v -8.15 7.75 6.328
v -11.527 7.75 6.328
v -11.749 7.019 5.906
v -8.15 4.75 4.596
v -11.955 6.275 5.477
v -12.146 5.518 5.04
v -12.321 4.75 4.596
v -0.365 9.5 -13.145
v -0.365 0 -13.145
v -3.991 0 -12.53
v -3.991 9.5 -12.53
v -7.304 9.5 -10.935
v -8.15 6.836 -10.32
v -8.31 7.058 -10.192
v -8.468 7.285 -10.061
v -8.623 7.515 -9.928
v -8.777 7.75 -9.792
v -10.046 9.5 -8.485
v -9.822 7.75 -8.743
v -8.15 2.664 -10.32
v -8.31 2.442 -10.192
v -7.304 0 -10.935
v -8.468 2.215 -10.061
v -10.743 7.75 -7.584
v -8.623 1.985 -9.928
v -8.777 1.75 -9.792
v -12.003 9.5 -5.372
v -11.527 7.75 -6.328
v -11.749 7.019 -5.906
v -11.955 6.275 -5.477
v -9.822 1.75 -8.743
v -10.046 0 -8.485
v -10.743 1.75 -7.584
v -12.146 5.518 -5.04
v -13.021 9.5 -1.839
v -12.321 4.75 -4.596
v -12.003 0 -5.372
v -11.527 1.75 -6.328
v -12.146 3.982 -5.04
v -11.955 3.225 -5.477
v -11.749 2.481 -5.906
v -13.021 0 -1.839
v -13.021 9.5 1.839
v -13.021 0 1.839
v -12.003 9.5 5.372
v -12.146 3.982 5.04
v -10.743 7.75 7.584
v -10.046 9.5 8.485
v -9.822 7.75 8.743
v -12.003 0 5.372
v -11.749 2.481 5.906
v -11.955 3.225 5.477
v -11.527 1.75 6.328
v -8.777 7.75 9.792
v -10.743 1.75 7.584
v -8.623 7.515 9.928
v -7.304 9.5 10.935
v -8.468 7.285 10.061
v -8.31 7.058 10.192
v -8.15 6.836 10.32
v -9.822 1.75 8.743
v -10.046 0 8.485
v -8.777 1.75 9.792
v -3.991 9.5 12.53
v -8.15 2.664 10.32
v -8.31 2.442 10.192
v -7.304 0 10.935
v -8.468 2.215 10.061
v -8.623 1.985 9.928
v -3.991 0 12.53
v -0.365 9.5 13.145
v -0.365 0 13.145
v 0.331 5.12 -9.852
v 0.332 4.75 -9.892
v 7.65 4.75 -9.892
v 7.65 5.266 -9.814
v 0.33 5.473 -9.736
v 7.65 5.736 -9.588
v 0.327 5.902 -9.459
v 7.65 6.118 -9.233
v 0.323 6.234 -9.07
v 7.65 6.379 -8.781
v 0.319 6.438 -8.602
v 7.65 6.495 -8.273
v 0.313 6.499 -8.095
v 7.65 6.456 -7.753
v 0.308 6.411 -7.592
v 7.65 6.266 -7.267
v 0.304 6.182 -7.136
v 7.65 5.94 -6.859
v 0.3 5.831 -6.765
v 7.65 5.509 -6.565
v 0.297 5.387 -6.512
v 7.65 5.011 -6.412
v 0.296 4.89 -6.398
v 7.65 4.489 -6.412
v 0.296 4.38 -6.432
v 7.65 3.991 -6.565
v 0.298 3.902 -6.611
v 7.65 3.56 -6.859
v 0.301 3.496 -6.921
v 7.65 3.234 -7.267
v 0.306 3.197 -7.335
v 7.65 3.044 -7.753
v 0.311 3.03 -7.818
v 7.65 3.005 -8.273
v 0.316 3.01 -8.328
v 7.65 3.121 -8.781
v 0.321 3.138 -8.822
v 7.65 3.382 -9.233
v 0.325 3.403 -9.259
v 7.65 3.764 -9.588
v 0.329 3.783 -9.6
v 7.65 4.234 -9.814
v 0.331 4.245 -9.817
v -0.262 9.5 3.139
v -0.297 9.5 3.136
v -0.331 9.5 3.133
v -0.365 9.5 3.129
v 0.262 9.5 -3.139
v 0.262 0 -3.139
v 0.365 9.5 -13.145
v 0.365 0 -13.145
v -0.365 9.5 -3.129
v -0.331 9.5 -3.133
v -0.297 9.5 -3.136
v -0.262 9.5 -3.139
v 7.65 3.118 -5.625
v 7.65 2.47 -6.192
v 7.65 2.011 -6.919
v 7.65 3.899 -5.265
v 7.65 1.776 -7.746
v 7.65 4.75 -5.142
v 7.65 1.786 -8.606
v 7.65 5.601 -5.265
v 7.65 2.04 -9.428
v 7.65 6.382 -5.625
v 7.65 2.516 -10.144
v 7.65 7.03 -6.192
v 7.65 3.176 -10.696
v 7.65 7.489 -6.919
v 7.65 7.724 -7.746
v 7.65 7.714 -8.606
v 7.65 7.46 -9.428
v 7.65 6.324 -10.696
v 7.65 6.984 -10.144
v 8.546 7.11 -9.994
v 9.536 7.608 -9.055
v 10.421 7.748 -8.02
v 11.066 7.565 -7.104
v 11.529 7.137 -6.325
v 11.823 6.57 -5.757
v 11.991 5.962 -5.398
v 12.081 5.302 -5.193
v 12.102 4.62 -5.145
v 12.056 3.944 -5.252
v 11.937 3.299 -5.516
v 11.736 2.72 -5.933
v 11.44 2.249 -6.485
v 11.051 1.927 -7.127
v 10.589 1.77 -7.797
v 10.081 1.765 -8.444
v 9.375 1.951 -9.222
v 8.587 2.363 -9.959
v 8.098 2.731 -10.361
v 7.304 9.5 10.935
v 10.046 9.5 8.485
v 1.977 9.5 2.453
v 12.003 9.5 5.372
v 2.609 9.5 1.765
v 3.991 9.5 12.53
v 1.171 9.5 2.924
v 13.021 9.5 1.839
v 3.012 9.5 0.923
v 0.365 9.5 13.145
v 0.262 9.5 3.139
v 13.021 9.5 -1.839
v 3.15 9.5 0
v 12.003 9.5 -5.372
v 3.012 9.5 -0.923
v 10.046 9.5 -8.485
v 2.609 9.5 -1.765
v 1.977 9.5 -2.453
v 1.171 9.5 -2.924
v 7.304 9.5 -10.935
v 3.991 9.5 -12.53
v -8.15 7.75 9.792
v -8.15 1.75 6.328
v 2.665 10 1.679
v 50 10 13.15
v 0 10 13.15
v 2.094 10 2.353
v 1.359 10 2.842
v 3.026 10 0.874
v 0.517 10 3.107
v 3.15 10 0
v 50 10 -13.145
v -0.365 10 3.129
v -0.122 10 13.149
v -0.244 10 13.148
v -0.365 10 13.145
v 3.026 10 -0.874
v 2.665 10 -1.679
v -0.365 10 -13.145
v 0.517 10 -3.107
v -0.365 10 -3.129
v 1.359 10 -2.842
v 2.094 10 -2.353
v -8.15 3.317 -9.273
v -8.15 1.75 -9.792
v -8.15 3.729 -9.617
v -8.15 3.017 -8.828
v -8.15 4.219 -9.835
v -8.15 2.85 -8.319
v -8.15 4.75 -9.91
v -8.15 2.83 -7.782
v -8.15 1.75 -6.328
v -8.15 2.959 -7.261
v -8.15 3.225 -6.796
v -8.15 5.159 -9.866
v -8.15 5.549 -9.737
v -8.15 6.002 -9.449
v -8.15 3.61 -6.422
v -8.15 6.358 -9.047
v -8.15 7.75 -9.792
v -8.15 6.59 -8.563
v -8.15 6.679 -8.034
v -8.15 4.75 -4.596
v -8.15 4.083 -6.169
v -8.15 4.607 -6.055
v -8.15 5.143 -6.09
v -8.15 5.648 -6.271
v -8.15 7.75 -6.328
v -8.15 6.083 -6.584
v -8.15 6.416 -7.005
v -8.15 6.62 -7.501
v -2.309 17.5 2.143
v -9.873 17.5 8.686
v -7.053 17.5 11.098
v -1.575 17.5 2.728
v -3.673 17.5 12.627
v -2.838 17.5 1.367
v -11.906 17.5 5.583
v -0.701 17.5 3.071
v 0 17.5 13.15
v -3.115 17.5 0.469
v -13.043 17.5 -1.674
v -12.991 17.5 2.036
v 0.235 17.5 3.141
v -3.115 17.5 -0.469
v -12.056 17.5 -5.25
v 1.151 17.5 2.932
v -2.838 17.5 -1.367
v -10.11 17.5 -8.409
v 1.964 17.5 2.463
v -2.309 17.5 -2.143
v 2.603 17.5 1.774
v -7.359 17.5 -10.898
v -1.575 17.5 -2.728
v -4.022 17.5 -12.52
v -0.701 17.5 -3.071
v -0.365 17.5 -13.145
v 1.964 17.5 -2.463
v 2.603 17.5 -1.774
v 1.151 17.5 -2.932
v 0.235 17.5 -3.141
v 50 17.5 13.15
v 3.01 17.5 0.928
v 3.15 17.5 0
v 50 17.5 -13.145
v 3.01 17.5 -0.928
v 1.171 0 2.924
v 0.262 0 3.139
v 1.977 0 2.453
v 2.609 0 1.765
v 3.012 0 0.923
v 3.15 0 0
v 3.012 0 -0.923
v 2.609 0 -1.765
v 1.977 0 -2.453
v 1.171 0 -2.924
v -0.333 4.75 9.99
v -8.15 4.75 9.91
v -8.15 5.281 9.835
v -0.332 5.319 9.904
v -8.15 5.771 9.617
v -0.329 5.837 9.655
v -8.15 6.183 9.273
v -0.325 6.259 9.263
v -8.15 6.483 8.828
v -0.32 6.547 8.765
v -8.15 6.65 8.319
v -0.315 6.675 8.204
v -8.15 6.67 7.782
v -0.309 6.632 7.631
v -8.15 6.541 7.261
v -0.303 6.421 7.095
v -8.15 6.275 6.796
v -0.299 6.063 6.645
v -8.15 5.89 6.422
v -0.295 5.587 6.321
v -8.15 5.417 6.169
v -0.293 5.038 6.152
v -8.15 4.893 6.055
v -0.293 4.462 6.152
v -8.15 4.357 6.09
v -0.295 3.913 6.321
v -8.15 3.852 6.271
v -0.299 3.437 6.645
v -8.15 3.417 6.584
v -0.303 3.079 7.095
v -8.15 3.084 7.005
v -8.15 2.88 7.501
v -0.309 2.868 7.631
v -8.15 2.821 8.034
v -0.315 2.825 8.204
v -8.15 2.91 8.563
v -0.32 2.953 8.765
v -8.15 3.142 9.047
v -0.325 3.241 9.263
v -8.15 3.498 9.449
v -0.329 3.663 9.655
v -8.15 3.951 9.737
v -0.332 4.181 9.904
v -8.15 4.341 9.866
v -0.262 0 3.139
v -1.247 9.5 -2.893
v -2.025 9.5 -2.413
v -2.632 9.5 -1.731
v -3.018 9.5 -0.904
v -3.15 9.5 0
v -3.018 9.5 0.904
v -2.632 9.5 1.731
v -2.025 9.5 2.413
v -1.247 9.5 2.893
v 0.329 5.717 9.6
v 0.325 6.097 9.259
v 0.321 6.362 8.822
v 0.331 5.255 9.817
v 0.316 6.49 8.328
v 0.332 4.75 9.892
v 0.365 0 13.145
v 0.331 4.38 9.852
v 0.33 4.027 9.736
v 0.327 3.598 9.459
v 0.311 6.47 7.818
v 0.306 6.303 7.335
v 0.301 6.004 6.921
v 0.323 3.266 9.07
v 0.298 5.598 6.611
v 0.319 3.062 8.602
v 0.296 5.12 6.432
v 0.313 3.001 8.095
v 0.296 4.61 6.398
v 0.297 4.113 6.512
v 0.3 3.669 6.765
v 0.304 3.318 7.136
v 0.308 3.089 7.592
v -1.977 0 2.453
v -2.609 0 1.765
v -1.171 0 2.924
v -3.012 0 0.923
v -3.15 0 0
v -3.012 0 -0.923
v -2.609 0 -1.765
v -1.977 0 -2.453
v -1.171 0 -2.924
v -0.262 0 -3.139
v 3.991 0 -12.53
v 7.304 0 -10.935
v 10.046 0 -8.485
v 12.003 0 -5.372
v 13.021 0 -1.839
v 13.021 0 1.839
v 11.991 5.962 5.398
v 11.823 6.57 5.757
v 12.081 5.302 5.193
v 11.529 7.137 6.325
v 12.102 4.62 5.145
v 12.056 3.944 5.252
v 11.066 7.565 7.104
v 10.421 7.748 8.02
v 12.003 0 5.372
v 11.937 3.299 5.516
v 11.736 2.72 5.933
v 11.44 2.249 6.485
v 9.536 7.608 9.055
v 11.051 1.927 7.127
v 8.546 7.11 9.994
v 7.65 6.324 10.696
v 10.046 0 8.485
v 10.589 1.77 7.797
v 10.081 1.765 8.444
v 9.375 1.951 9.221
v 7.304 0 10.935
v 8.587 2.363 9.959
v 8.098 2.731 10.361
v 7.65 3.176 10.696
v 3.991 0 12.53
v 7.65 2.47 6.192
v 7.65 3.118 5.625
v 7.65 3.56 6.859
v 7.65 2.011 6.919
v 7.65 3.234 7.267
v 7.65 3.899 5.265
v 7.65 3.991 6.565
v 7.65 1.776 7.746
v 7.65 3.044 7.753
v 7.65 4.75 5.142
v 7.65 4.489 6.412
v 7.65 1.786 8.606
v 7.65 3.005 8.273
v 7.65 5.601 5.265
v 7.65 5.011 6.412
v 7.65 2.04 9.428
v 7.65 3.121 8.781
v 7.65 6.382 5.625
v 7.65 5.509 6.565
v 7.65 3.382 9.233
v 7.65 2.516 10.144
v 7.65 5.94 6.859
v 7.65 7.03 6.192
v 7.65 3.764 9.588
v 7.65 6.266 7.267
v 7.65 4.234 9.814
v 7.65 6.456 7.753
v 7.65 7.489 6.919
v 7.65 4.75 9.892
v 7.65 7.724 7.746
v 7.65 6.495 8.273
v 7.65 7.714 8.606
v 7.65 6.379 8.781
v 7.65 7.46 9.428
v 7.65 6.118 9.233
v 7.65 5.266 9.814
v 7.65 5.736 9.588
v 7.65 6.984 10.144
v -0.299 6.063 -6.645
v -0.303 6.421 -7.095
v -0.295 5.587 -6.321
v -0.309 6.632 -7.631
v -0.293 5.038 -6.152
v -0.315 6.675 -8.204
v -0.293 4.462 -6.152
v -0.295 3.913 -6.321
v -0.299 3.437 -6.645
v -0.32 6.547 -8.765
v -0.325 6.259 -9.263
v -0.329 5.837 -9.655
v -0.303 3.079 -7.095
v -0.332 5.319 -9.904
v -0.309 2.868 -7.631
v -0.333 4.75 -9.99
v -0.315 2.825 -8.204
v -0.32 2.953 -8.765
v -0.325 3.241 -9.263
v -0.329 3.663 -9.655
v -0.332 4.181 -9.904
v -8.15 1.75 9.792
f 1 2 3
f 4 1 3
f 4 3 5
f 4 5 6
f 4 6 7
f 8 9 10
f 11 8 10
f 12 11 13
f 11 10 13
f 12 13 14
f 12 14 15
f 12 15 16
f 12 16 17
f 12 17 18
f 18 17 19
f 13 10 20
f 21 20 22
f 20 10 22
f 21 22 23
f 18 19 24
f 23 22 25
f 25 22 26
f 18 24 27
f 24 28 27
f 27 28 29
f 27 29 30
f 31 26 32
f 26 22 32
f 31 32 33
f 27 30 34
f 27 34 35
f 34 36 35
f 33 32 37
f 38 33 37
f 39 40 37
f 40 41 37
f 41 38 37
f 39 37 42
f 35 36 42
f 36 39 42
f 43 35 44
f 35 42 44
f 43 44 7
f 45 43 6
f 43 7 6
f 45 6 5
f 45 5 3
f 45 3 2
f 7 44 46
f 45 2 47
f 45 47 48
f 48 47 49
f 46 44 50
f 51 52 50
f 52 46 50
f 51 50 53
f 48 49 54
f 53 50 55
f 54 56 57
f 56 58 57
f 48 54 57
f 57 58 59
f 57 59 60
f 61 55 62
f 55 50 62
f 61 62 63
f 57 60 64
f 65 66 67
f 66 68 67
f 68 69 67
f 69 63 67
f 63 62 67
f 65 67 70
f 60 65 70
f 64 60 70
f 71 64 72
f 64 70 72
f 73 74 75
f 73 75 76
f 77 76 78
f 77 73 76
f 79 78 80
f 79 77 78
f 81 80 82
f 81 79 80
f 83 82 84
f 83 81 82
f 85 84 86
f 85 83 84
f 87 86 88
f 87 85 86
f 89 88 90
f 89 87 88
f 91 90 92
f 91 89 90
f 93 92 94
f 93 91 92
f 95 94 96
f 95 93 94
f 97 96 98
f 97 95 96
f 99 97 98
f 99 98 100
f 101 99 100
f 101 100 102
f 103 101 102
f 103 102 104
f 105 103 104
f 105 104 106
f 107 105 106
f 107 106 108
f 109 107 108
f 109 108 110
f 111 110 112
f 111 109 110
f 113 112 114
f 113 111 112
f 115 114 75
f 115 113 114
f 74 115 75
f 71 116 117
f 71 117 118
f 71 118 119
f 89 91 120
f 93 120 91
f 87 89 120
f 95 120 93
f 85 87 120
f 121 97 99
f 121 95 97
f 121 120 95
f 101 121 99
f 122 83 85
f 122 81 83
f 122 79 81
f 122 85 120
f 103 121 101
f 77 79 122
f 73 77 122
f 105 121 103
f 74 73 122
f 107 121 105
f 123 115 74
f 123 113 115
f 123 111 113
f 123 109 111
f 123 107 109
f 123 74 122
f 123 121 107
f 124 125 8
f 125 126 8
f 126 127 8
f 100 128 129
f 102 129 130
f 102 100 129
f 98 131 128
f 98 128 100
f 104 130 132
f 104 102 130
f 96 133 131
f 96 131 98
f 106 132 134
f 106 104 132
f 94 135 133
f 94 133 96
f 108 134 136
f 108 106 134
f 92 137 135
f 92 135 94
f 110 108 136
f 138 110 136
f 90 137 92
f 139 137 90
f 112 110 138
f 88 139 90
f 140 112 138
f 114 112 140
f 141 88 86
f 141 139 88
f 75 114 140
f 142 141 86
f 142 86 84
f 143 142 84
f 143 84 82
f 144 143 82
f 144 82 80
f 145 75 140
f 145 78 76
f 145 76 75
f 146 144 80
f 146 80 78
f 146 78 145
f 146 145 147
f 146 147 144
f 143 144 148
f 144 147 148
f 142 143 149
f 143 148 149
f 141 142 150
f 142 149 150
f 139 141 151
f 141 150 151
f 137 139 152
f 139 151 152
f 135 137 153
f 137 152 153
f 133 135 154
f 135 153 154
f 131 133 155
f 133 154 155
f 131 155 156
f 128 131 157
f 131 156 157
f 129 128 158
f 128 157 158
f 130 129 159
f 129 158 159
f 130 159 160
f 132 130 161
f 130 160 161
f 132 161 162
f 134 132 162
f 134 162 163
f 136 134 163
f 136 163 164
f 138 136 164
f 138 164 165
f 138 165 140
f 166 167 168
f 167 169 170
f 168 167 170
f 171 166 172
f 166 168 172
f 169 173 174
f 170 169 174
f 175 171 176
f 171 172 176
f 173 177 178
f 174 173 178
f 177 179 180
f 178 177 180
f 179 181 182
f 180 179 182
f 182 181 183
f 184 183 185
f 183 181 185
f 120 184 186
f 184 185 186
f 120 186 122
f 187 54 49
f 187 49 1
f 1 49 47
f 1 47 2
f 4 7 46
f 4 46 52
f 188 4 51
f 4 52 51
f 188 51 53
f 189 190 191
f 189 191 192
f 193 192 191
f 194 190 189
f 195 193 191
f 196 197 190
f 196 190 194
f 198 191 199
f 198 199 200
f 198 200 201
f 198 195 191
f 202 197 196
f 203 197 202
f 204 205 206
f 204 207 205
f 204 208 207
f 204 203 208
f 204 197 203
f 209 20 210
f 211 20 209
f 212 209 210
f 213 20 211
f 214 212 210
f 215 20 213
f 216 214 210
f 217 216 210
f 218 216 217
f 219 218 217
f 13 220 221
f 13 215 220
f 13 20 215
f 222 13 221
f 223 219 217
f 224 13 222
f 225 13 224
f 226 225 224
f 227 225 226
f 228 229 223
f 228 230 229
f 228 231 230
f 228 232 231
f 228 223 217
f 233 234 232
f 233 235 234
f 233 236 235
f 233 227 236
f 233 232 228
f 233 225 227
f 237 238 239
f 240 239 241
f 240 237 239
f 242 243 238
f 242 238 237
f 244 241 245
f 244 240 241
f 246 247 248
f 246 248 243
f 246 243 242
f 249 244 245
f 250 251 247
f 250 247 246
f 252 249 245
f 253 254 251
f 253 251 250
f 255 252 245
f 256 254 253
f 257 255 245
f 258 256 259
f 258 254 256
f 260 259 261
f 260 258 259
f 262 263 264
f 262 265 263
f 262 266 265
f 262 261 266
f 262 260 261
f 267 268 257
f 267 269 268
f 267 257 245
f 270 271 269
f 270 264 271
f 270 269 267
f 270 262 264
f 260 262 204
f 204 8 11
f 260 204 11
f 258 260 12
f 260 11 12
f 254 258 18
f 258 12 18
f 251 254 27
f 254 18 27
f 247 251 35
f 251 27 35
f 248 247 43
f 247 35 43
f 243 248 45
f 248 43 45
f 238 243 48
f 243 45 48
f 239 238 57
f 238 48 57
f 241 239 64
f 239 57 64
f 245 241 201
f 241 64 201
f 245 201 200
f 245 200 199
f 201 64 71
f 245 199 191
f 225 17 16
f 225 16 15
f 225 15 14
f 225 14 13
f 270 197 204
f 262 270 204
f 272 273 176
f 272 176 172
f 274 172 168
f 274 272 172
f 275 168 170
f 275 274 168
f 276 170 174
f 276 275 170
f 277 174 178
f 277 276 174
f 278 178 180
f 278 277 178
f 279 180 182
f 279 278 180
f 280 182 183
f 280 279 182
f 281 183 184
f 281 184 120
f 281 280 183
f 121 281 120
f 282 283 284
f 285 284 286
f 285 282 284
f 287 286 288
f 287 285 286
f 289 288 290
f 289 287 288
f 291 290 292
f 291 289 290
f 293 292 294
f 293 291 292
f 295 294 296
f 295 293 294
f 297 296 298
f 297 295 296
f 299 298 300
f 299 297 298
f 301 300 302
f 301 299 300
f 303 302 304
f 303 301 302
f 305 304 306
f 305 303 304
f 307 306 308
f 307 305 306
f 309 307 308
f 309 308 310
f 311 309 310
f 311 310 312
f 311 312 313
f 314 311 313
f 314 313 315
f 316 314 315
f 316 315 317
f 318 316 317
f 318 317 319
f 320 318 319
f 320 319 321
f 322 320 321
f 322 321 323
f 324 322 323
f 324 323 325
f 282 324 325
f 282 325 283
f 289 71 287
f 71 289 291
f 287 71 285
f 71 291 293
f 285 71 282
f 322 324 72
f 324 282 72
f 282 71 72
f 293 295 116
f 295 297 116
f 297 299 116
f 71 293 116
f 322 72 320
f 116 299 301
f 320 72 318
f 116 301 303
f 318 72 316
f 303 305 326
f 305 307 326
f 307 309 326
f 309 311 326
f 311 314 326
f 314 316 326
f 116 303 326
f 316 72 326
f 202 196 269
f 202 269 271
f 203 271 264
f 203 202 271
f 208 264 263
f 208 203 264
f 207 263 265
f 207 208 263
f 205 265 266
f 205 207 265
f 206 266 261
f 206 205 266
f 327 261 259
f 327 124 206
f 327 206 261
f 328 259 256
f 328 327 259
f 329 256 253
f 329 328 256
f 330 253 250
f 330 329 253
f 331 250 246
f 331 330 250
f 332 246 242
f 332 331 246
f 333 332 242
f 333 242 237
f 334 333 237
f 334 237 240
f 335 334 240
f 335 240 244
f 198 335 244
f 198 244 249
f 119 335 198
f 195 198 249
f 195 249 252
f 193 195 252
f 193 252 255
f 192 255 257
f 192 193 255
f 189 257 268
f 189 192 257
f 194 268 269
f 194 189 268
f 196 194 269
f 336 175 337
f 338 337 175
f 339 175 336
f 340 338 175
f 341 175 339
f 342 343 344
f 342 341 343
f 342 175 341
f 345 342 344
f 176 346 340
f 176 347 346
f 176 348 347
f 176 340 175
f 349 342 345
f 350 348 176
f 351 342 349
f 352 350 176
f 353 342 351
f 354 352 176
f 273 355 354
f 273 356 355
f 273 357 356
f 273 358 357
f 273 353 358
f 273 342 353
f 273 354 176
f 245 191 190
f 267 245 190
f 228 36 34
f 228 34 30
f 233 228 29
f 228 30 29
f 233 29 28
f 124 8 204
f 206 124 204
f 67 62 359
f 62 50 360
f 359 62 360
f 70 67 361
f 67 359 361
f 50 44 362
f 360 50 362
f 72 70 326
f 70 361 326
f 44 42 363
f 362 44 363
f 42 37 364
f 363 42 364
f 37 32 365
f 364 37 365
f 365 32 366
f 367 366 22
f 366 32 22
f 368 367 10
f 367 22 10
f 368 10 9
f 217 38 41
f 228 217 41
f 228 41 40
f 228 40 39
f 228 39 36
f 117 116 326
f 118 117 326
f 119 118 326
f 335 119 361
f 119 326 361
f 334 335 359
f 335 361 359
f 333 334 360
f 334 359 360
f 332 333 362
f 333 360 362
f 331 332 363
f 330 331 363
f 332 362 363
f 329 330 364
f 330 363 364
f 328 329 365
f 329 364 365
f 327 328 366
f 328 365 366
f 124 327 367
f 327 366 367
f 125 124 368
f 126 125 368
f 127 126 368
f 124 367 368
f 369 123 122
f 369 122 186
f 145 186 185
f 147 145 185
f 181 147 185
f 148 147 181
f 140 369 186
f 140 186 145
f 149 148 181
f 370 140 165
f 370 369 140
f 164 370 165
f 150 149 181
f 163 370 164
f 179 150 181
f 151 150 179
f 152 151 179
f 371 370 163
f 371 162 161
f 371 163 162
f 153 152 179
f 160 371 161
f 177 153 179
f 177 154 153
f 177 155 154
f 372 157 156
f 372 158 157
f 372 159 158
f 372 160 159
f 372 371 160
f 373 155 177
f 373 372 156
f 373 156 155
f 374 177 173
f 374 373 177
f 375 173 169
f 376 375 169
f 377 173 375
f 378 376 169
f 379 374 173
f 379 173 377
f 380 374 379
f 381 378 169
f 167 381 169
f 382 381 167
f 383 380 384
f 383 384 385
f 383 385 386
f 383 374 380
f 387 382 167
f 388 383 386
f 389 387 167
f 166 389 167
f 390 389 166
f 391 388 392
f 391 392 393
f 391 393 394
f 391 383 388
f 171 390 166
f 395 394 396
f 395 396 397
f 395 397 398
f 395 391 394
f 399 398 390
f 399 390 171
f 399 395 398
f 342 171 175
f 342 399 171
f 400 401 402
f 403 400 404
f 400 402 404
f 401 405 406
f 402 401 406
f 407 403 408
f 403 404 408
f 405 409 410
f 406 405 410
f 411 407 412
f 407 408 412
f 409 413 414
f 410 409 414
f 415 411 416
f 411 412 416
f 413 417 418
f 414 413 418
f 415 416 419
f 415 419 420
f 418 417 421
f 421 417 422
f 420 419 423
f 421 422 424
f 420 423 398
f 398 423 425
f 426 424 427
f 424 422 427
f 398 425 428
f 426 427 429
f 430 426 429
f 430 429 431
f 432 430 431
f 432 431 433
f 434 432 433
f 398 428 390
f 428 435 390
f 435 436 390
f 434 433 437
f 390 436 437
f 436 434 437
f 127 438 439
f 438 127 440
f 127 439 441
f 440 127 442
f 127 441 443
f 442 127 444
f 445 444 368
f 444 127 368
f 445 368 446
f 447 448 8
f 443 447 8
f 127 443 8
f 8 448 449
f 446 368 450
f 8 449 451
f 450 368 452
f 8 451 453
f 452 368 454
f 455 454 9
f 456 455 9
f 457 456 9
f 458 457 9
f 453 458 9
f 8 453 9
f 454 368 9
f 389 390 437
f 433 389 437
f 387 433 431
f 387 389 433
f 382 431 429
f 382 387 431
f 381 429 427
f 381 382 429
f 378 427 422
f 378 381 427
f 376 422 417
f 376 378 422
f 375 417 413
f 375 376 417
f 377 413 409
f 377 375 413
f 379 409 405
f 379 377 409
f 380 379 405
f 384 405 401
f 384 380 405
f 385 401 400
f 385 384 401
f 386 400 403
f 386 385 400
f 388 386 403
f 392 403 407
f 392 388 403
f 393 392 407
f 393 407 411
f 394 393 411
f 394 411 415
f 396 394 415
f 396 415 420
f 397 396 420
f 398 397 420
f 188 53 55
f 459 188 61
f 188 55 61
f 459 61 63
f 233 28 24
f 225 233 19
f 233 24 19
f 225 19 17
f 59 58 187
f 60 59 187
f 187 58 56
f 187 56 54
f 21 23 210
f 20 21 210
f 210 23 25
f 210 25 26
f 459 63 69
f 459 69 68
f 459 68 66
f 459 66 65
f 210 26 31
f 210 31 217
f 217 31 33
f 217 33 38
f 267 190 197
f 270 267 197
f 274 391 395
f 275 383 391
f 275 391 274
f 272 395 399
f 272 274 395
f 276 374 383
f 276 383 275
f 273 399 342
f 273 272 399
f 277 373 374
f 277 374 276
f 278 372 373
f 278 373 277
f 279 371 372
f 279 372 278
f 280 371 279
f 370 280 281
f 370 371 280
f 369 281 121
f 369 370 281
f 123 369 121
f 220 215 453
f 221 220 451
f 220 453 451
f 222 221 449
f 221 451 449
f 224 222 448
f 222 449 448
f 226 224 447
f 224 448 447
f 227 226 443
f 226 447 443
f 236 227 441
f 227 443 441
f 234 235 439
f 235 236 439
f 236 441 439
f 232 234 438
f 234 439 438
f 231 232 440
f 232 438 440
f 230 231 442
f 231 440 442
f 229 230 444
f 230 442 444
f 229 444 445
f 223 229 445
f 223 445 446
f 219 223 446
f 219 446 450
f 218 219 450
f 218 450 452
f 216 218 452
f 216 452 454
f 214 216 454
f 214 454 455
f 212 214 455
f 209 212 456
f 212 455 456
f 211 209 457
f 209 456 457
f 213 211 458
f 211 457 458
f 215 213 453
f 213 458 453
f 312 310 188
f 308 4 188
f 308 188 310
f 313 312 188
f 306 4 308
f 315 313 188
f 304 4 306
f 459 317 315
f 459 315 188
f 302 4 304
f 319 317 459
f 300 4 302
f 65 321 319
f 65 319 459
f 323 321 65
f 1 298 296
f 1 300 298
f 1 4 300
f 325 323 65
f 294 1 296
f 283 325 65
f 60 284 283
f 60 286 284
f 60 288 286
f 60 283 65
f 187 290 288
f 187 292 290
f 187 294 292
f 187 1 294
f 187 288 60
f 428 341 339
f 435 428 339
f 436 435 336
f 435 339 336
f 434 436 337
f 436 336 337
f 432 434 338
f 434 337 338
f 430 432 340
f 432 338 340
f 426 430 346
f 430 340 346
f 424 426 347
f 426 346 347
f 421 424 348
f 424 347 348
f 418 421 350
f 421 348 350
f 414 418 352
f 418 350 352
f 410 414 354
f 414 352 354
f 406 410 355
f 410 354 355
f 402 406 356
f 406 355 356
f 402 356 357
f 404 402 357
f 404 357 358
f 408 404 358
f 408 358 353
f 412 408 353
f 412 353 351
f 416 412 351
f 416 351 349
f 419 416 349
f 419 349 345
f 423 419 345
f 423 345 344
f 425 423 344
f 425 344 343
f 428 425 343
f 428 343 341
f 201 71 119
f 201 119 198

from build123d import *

# Parameters (mm, degrees)
BOSS_EXTRUDE1_DEPTH   = 9.5
BOSS_EXTRUDE1_2_DEPTH = 9.5
SKETCH2_R             = 3
CUT_EXTRUDE1_DEPTH    = 5.5
CUT_EXTRUDE2_START    = -21.8
SKETCH3_R             = 1.75
CUT_EXTRUDE2_DEPTH    = 28.3000001
SKETCH5_R             = 3.15
BOSS_EXTRUDE2_DEPTH   = 8
SKETCH6_W             = 50.365277778
SKETCH6_H             = 0.5
CUT_EXTRUDE3_DEPTH    = 27.294925719
SKETCH15_R            = 1.93
CUT_EXTRUDE12_DEPTH   = 14.054128206
CUT_EXTRUDE14_DEPTH   = 5


with BuildPart() as part:
    # Sketch1 → Boss-Extrude1 (new body)
    with BuildSketch(Plane(origin=(0, 0, 0), x_dir=(1, 0, 0), z_dir=(0, 1, 0))):
        with BuildLine():
            Line((-0.2625, 3.139043445), (-0.365277778, 13.144925719))
            ThreePointArc((-0.365277778, 13.144925719), (-13.15, 0), (-0.365277778, -13.144925719))
            Line((-0.365277778, -13.144925719), (-0.2625, -3.139043445))
            ThreePointArc((-0.2625, -3.139043445), (-3.15, 0), (-0.2625, 3.139043445))
        make_face()
    extrude(amount=BOSS_EXTRUDE1_DEPTH)


with BuildPart() as body_2:
    # Sketch1 → Boss-Extrude1 2 (new body)
    with BuildSketch(Plane(origin=(0, 0, 0), x_dir=(1, 0, 0), z_dir=(0, 1, 0))):
        with BuildLine():
            Line((0.2625, 3.139043445), (0.365277778, 13.144925719))
            ThreePointArc((0.365277778, 13.144925719), (13.15, 0), (0.365277778, -13.144925719))
            Line((0.365277778, -13.144925719), (0.2625, -3.139043445))
            ThreePointArc((0.2625, -3.139043445), (3.15, 0), (0.2625, 3.139043445))
        make_face()
    extrude(amount=BOSS_EXTRUDE1_2_DEPTH)

    # Sketch2 → Cut-Extrude1 (cut)
    with BuildSketch(Plane(origin=(13.15, 0, 0), x_dir=(0, 0, -1), z_dir=(1, 0, 0))):
        with Locations((8.141984582, 4.75)):
            Circle(SKETCH2_R)
    cut_extrude1 = extrude(amount=-CUT_EXTRUDE1_DEPTH, mode=Mode.SUBTRACT)


with BuildPart() as cut_extrude2_tool:
    # Sketch3 → Cut-Extrude2 (new body)
    with BuildSketch(Plane(origin=(7.65, 0, 0), x_dir=(0, 0, -1), z_dir=(1, 0, 0)).offset(CUT_EXTRUDE2_START)):
        with Locations((8.141984582, 4.75)):
            Circle(SKETCH3_R)
    cut_extrude2 = extrude(amount=CUT_EXTRUDE2_DEPTH)


with BuildPart() as part_1:
    add(part.part)

    # Cut-Extrude2: cut by cut_extrude2_tool
    add(cut_extrude2_tool.part, mode=Mode.SUBTRACT)

    # Sketch5 → Boss-Extrude2 (add)
    with BuildSketch(Plane(origin=(0, 9.5, 0), x_dir=(1, 0, 0), z_dir=(0, 1, 0))):
        with BuildLine():
            ThreePointArc((-0.365277778, 13.144925719), (-13.148731368, -0.18265651), (0, -13.15))
            Line((0, -13.15), (50, -13.15))
            Line((50, -13.15), (50, 13.144925719))
            Line((50, 13.144925719), (0.365277778, 13.144925719))
            Line((0.365277778, 13.144925719), (-0.365277778, 13.144925719))
        make_face()
        Circle(SKETCH5_R, mode=Mode.SUBTRACT)
    extrude(amount=BOSS_EXTRUDE2_DEPTH)

    # Sketch6 → Cut-Extrude3 (cut, through all)
    with BuildSketch(Plane(origin=(0, 0, -13.144925719), x_dir=(-1, 0, 0), z_dir=(0, 0, -1))):
        with Locations((-24.817361111, 9.75)):
            Rectangle(SKETCH6_W, SKETCH6_H)
    extrude(amount=-CUT_EXTRUDE3_DEPTH, mode=Mode.SUBTRACT)

    # Sketch15 → Cut-Extrude12 (cut, through all)
    with BuildSketch(Plane(origin=(-0.230232284, 0, 0.002364885), x_dir=(-0.010271194, 0, -0.99994725), z_dir=(0.99994725, 0, -0.010271194))):
        with Locations((8.062980458, 4.75)):
            Circle(SKETCH15_R)
    cut_extrude12 = extrude(amount=-CUT_EXTRUDE12_DEPTH, mode=Mode.SUBTRACT)


with BuildPart() as body_2_1:
    add(body_2.part)

    # Cut-Extrude2: cut by cut_extrude2_tool
    add(cut_extrude2_tool.part, mode=Mode.SUBTRACT)


with BuildPart() as mirror11_tool:
    # Mirror11: Cut-Extrude1, Cut-Extrude2, Cut-Extrude12 across plane
    add(cut_extrude1.mirror(Plane.XY))
    add(cut_extrude2.mirror(Plane.XY))
    add(cut_extrude12.mirror(Plane.XY))


with BuildPart() as part_2:
    add(part_1.part)

    # Mirror11: cut by mirror11_tool
    add(mirror11_tool.part, mode=Mode.SUBTRACT)

    # Sketch16 → Cut-Extrude14 (cut)
    with BuildSketch(Plane.ZY.offset(13.15)):
        Polygon((9.792241058, 7.75), (6.328139443, 7.75), (4.596088635, 4.75), (6.328139443, 1.75), (9.792241058, 1.75), (11.524291865, 4.75), align=None)
        Polygon((-4.596088635, 4.75), (-6.328139443, 7.75), (-9.792241058, 7.75), (-11.524291865, 4.75), (-9.792241058, 1.75), (-6.328139443, 1.75), align=None)
    extrude(amount=-CUT_EXTRUDE14_DEPTH, mode=Mode.SUBTRACT)


with BuildPart() as body_2_2:
    add(body_2_1.part)

    # Mirror11: cut by mirror11_tool
    add(mirror11_tool.part, mode=Mode.SUBTRACT)


solid = Compound([part_2.part, body_2_2.part])
